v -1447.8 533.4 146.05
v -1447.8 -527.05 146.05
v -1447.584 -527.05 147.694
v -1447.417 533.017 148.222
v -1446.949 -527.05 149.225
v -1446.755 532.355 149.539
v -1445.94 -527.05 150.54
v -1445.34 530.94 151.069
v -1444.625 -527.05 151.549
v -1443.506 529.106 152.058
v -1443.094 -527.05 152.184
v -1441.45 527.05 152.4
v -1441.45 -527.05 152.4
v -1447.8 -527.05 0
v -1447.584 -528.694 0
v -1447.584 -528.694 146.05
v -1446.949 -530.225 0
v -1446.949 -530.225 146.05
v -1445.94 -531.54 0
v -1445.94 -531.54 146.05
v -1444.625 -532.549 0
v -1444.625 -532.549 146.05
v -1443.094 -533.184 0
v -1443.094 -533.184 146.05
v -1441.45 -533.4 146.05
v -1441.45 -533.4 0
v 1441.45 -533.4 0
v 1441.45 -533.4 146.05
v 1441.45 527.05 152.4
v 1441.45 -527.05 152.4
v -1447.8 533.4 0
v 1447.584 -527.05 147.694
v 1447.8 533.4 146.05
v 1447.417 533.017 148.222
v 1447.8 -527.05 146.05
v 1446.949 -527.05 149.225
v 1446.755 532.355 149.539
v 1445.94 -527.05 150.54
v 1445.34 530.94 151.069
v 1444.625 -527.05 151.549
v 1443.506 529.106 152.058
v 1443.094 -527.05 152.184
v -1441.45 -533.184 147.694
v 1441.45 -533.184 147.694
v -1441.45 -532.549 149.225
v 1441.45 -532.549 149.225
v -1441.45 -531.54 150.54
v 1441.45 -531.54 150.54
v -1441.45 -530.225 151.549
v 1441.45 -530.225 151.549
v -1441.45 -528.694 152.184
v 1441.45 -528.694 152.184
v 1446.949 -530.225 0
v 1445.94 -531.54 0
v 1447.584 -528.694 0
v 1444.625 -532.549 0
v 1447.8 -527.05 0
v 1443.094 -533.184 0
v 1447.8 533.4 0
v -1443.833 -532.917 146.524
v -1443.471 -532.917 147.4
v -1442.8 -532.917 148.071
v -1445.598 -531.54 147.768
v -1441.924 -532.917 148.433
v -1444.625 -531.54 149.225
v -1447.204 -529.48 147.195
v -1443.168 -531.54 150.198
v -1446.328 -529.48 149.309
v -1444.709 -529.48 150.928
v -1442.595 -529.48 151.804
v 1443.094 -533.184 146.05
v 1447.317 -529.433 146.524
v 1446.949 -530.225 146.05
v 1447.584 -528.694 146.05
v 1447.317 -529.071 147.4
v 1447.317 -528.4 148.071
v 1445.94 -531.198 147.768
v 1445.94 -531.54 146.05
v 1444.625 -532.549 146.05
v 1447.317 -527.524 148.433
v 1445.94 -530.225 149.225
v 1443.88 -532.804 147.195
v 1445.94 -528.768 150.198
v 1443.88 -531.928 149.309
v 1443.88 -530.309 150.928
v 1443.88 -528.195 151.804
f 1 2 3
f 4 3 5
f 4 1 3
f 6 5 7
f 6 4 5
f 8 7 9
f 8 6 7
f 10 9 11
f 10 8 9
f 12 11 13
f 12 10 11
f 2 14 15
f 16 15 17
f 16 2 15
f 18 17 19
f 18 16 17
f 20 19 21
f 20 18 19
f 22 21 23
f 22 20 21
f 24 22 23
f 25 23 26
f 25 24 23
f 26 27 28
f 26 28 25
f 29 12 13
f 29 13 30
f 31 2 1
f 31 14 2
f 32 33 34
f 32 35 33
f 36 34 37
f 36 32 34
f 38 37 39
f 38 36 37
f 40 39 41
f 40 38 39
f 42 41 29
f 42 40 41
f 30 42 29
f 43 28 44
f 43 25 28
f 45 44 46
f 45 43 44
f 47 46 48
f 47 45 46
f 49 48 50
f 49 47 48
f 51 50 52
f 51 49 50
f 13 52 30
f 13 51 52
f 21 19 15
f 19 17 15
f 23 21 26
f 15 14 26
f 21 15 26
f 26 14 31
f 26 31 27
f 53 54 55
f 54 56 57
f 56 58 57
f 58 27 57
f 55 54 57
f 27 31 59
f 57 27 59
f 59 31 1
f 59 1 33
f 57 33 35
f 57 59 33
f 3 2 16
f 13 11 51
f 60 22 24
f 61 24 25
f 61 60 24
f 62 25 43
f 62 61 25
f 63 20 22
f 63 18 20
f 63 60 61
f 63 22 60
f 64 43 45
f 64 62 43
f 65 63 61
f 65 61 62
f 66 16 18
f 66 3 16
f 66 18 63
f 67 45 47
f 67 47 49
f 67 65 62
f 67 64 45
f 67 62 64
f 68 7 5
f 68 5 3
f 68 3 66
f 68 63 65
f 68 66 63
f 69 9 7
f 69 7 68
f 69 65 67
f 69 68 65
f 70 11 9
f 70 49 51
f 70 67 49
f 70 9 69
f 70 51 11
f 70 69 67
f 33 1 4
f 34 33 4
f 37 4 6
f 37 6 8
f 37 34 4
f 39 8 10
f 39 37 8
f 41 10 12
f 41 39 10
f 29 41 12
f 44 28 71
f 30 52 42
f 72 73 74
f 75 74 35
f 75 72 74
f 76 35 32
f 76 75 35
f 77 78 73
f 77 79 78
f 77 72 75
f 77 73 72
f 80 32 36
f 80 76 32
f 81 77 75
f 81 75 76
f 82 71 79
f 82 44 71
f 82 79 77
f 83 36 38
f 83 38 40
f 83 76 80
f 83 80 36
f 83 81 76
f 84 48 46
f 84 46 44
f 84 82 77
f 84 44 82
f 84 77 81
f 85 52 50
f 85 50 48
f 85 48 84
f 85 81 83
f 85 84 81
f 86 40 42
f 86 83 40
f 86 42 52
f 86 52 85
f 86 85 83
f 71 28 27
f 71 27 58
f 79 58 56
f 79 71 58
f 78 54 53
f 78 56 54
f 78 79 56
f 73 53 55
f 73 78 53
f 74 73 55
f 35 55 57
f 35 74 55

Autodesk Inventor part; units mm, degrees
ref_plane "YZ Plane" through (0, 0, 0) normal (1, 0, 0) x (0, 1, 0)
ref_plane "XZ Plane" through (0, 0, 0) normal (0, 1, 0) x (-1, 0, 0)
ref_plane "XY Plane" through (0, 0, 0) normal (0, 0, 1) x (1, 0, 0)
sketch "Sketch1" plane through (0, 0, 0) normal (0, 0, 1) x (1, 0, 0)
  line L0 (-1447.8, 533.4) -> (1447.8, 533.4)
  line L1 (1447.8, 533.4) -> (1447.8, -533.4)
  line L2 (1447.8, -533.4) -> (-1447.8, -533.4)
  line L3 (-1447.8, -533.4) -> (-1447.8, 533.4)
  line L4 (-1447.8, 533.4) -> (1447.8, -533.4) construction
  line L5 (1447.8, 533.4) -> (-1447.8, -533.4) construction
  point P0 (0, 0)
  dimension "d0" = 2895.6
  dimension "d1" = 1066.8
extrude "Extrusion1" add sketch "Sketch1" along normal blind 152.4
fillet "Fillet1" radius 6.35 6 edges at (0, 533.4, 152.4) (-1447.8, 0, 152.4) (0, -533.4, 152.4) (1447.8, 0, 152.4) (1447.8, -533.4, 76.2) (-1447.8, -533.4, 76.2)
properties part number "3-1x-114x42x6 sn step" material "Granite, Cut, Polished"
